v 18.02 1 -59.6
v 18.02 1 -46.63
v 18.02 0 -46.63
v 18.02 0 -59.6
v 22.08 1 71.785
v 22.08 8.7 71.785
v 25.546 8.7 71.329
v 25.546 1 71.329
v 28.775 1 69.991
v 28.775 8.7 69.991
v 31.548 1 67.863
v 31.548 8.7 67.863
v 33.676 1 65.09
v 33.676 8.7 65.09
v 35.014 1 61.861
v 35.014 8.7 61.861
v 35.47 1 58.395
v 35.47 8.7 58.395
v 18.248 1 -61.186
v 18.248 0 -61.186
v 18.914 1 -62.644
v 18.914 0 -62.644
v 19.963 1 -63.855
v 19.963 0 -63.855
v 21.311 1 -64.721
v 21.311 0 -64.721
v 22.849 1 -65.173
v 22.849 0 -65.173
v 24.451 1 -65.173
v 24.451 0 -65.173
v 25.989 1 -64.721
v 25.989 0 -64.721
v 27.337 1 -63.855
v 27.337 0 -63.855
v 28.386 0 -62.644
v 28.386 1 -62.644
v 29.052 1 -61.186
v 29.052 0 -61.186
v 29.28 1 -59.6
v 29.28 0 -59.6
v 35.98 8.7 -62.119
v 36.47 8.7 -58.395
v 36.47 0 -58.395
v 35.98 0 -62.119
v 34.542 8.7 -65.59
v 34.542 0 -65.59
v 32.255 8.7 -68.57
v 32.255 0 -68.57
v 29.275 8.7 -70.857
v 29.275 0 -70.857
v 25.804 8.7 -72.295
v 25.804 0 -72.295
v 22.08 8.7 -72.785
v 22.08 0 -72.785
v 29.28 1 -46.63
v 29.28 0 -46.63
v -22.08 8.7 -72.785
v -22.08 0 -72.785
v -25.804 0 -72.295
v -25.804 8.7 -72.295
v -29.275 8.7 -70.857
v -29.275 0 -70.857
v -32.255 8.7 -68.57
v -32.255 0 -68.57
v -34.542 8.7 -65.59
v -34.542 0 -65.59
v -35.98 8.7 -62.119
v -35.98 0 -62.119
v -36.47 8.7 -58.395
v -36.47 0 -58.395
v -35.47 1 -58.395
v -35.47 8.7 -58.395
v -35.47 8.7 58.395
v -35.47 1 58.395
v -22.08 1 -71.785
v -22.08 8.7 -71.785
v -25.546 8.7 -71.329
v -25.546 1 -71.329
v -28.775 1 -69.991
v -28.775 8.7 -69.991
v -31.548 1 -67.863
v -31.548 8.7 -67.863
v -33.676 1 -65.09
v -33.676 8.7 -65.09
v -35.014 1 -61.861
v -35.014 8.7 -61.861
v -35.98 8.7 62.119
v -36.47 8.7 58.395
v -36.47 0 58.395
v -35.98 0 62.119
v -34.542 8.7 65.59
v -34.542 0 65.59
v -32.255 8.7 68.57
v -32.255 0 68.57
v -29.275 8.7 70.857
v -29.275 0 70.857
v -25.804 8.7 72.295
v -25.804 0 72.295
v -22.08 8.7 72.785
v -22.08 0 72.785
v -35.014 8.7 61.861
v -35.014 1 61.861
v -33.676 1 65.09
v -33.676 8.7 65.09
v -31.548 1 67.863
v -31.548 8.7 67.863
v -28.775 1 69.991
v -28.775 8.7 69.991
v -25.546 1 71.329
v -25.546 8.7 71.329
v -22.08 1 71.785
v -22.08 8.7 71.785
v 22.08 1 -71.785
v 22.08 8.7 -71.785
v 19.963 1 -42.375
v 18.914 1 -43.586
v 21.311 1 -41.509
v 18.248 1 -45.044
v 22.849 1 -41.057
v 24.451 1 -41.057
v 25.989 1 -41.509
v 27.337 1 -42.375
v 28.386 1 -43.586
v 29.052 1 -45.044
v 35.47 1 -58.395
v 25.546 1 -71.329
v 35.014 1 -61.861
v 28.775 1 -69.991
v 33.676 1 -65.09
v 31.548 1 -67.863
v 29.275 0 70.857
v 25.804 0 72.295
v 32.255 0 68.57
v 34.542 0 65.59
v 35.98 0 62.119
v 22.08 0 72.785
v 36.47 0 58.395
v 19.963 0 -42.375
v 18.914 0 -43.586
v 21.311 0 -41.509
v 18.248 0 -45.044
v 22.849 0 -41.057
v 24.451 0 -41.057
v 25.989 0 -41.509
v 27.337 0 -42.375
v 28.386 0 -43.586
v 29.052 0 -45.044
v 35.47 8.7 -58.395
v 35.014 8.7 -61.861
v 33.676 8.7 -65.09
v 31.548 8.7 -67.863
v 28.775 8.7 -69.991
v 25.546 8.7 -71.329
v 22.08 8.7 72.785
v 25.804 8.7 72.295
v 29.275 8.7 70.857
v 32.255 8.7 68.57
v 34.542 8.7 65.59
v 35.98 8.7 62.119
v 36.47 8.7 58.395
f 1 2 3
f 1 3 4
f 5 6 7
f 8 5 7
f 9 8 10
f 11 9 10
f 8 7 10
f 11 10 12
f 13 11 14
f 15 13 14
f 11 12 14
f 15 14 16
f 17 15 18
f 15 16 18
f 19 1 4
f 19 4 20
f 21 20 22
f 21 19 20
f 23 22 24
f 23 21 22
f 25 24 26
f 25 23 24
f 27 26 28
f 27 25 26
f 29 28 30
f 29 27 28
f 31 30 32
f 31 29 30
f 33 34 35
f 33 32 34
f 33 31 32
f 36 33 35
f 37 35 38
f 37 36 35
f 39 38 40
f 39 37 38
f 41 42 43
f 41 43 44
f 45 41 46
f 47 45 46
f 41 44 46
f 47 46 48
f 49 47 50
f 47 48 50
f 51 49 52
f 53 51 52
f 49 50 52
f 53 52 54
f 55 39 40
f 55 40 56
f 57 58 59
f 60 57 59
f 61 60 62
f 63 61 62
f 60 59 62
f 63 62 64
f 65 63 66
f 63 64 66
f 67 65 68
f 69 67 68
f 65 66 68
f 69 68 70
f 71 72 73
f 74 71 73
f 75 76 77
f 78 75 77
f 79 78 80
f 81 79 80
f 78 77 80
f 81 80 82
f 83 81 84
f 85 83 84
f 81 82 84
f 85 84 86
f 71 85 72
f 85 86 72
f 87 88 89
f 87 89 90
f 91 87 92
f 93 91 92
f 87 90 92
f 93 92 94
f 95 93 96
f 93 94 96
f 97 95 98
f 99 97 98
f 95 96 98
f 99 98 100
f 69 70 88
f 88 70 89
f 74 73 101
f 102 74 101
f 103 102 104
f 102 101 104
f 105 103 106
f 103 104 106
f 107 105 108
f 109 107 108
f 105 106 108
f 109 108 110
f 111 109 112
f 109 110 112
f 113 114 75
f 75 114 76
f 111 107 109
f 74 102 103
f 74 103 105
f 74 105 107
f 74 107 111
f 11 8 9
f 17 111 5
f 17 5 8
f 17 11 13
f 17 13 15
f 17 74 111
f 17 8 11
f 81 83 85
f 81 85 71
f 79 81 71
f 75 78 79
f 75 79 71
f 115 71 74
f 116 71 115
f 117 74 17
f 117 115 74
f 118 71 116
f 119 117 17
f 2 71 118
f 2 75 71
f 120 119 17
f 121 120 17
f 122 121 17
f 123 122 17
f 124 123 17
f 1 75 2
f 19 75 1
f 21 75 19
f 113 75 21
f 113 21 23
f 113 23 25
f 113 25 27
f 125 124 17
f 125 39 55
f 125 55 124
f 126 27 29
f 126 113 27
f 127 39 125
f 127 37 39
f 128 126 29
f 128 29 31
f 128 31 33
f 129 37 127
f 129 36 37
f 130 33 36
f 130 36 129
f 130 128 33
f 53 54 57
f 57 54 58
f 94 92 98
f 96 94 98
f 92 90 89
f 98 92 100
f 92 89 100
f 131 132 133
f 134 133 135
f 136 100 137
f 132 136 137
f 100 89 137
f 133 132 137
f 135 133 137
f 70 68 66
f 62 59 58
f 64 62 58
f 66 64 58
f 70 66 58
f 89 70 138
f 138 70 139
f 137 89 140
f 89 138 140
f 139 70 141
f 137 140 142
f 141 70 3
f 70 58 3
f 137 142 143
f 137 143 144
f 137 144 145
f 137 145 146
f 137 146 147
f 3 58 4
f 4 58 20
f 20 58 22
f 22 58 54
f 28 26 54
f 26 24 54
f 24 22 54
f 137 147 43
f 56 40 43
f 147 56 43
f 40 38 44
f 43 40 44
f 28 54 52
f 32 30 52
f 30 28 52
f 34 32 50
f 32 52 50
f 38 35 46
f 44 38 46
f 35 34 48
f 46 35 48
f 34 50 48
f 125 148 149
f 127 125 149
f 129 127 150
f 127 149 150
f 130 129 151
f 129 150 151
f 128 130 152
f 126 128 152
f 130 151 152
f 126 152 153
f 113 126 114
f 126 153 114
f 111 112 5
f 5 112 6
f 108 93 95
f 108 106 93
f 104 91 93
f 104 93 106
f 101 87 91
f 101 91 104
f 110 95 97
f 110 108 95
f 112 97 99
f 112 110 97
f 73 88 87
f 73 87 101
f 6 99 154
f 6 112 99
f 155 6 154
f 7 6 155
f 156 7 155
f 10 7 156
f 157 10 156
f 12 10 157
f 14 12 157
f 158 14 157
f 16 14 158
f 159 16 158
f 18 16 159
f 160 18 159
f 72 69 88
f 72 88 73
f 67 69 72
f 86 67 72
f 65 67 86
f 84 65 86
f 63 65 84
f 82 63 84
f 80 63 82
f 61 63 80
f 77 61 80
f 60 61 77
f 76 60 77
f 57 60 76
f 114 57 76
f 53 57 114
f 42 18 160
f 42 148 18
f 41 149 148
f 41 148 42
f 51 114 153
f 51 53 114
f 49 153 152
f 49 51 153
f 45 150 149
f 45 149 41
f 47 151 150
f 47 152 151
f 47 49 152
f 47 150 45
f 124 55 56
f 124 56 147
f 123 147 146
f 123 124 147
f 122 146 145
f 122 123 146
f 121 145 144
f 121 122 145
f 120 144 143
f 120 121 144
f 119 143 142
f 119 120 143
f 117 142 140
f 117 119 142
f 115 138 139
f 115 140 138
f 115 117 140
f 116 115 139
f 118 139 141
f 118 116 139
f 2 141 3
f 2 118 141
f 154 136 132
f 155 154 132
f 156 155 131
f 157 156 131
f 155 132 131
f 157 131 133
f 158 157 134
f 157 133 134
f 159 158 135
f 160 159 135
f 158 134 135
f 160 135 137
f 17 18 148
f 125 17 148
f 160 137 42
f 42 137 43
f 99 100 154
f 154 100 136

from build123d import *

# Parameters (mm, degrees)
BOSS_EXTRUDE1_DEPTH = 8.7
CUT_EXTRUDE1_DEPTH  = 7.7
CUT_EXTRUDE2_DEPTH  = 2


with BuildPart() as part:
    # Sketch1 → Boss-Extrude1 (new body)
    with BuildSketch(Plane(origin=(0, 0, 0), x_dir=(1, 0, 0), z_dir=(0, 1, 0))):
        with BuildLine():
            Line((-22.08, -72.785), (22.08, -72.785))
            ThreePointArc((22.08, -72.785), (32.255266581, -68.570266581), (36.47, -58.395))
            Line((36.47, -58.395), (36.47, 58.395))
            ThreePointArc((36.47, 58.395), (32.255266581, 68.570266581), (22.08, 72.785))
            Line((22.08, 72.785), (-22.08, 72.785))
            ThreePointArc((-22.08, 72.785), (-32.255266581, 68.570266581), (-36.47, 58.395))
            Line((-36.47, 58.395), (-36.47, -58.395))
            ThreePointArc((-36.47, -58.395), (-32.255266581, -68.570266581), (-22.08, -72.785))
        make_face()
    extrude(amount=BOSS_EXTRUDE1_DEPTH)

    # Sketch2 → Cut-Extrude1 (cut)
    with BuildSketch(Plane(origin=(0, 8.7, 0), x_dir=(1, 0, 0), z_dir=(0, 1, 0))):
        with BuildLine():
            Line((-22.08, -71.785), (22.08, -71.785))
            ThreePointArc((22.08, -71.785), (31.5481598, -67.8631598), (35.47, -58.395))
            Line((35.47, -58.395), (35.47, 58.395))
            ThreePointArc((35.47, 58.395), (31.5481598, 67.8631598), (22.08, 71.785))
            Line((22.08, 71.785), (-22.08, 71.785))
            ThreePointArc((-22.08, 71.785), (-31.5481598, 67.8631598), (-35.47, 58.395))
            Line((-35.47, 58.395), (-35.47, -58.395))
            ThreePointArc((-35.47, -58.395), (-31.5481598, -67.8631598), (-22.08, -71.785))
        make_face()
    extrude(amount=-CUT_EXTRUDE1_DEPTH, mode=Mode.SUBTRACT)

    # Sketch3 → Cut-Extrude2 (cut, through all)
    with BuildSketch(Plane(origin=(0, 1, 0), x_dir=(1, 0, 0), z_dir=(0, 1, 0))):
        with BuildLine():
            Line((29.28, 59.6), (29.28, 46.63))
            ThreePointArc((29.28, 46.63), (23.65, 41), (18.02, 46.63))
            Line((18.02, 46.63), (18.02, 59.6))
            ThreePointArc((18.02, 59.6), (23.65, 65.23), (29.28, 59.6))
        make_face()
    extrude(amount=-CUT_EXTRUDE2_DEPTH, mode=Mode.SUBTRACT)


solid = part.part
